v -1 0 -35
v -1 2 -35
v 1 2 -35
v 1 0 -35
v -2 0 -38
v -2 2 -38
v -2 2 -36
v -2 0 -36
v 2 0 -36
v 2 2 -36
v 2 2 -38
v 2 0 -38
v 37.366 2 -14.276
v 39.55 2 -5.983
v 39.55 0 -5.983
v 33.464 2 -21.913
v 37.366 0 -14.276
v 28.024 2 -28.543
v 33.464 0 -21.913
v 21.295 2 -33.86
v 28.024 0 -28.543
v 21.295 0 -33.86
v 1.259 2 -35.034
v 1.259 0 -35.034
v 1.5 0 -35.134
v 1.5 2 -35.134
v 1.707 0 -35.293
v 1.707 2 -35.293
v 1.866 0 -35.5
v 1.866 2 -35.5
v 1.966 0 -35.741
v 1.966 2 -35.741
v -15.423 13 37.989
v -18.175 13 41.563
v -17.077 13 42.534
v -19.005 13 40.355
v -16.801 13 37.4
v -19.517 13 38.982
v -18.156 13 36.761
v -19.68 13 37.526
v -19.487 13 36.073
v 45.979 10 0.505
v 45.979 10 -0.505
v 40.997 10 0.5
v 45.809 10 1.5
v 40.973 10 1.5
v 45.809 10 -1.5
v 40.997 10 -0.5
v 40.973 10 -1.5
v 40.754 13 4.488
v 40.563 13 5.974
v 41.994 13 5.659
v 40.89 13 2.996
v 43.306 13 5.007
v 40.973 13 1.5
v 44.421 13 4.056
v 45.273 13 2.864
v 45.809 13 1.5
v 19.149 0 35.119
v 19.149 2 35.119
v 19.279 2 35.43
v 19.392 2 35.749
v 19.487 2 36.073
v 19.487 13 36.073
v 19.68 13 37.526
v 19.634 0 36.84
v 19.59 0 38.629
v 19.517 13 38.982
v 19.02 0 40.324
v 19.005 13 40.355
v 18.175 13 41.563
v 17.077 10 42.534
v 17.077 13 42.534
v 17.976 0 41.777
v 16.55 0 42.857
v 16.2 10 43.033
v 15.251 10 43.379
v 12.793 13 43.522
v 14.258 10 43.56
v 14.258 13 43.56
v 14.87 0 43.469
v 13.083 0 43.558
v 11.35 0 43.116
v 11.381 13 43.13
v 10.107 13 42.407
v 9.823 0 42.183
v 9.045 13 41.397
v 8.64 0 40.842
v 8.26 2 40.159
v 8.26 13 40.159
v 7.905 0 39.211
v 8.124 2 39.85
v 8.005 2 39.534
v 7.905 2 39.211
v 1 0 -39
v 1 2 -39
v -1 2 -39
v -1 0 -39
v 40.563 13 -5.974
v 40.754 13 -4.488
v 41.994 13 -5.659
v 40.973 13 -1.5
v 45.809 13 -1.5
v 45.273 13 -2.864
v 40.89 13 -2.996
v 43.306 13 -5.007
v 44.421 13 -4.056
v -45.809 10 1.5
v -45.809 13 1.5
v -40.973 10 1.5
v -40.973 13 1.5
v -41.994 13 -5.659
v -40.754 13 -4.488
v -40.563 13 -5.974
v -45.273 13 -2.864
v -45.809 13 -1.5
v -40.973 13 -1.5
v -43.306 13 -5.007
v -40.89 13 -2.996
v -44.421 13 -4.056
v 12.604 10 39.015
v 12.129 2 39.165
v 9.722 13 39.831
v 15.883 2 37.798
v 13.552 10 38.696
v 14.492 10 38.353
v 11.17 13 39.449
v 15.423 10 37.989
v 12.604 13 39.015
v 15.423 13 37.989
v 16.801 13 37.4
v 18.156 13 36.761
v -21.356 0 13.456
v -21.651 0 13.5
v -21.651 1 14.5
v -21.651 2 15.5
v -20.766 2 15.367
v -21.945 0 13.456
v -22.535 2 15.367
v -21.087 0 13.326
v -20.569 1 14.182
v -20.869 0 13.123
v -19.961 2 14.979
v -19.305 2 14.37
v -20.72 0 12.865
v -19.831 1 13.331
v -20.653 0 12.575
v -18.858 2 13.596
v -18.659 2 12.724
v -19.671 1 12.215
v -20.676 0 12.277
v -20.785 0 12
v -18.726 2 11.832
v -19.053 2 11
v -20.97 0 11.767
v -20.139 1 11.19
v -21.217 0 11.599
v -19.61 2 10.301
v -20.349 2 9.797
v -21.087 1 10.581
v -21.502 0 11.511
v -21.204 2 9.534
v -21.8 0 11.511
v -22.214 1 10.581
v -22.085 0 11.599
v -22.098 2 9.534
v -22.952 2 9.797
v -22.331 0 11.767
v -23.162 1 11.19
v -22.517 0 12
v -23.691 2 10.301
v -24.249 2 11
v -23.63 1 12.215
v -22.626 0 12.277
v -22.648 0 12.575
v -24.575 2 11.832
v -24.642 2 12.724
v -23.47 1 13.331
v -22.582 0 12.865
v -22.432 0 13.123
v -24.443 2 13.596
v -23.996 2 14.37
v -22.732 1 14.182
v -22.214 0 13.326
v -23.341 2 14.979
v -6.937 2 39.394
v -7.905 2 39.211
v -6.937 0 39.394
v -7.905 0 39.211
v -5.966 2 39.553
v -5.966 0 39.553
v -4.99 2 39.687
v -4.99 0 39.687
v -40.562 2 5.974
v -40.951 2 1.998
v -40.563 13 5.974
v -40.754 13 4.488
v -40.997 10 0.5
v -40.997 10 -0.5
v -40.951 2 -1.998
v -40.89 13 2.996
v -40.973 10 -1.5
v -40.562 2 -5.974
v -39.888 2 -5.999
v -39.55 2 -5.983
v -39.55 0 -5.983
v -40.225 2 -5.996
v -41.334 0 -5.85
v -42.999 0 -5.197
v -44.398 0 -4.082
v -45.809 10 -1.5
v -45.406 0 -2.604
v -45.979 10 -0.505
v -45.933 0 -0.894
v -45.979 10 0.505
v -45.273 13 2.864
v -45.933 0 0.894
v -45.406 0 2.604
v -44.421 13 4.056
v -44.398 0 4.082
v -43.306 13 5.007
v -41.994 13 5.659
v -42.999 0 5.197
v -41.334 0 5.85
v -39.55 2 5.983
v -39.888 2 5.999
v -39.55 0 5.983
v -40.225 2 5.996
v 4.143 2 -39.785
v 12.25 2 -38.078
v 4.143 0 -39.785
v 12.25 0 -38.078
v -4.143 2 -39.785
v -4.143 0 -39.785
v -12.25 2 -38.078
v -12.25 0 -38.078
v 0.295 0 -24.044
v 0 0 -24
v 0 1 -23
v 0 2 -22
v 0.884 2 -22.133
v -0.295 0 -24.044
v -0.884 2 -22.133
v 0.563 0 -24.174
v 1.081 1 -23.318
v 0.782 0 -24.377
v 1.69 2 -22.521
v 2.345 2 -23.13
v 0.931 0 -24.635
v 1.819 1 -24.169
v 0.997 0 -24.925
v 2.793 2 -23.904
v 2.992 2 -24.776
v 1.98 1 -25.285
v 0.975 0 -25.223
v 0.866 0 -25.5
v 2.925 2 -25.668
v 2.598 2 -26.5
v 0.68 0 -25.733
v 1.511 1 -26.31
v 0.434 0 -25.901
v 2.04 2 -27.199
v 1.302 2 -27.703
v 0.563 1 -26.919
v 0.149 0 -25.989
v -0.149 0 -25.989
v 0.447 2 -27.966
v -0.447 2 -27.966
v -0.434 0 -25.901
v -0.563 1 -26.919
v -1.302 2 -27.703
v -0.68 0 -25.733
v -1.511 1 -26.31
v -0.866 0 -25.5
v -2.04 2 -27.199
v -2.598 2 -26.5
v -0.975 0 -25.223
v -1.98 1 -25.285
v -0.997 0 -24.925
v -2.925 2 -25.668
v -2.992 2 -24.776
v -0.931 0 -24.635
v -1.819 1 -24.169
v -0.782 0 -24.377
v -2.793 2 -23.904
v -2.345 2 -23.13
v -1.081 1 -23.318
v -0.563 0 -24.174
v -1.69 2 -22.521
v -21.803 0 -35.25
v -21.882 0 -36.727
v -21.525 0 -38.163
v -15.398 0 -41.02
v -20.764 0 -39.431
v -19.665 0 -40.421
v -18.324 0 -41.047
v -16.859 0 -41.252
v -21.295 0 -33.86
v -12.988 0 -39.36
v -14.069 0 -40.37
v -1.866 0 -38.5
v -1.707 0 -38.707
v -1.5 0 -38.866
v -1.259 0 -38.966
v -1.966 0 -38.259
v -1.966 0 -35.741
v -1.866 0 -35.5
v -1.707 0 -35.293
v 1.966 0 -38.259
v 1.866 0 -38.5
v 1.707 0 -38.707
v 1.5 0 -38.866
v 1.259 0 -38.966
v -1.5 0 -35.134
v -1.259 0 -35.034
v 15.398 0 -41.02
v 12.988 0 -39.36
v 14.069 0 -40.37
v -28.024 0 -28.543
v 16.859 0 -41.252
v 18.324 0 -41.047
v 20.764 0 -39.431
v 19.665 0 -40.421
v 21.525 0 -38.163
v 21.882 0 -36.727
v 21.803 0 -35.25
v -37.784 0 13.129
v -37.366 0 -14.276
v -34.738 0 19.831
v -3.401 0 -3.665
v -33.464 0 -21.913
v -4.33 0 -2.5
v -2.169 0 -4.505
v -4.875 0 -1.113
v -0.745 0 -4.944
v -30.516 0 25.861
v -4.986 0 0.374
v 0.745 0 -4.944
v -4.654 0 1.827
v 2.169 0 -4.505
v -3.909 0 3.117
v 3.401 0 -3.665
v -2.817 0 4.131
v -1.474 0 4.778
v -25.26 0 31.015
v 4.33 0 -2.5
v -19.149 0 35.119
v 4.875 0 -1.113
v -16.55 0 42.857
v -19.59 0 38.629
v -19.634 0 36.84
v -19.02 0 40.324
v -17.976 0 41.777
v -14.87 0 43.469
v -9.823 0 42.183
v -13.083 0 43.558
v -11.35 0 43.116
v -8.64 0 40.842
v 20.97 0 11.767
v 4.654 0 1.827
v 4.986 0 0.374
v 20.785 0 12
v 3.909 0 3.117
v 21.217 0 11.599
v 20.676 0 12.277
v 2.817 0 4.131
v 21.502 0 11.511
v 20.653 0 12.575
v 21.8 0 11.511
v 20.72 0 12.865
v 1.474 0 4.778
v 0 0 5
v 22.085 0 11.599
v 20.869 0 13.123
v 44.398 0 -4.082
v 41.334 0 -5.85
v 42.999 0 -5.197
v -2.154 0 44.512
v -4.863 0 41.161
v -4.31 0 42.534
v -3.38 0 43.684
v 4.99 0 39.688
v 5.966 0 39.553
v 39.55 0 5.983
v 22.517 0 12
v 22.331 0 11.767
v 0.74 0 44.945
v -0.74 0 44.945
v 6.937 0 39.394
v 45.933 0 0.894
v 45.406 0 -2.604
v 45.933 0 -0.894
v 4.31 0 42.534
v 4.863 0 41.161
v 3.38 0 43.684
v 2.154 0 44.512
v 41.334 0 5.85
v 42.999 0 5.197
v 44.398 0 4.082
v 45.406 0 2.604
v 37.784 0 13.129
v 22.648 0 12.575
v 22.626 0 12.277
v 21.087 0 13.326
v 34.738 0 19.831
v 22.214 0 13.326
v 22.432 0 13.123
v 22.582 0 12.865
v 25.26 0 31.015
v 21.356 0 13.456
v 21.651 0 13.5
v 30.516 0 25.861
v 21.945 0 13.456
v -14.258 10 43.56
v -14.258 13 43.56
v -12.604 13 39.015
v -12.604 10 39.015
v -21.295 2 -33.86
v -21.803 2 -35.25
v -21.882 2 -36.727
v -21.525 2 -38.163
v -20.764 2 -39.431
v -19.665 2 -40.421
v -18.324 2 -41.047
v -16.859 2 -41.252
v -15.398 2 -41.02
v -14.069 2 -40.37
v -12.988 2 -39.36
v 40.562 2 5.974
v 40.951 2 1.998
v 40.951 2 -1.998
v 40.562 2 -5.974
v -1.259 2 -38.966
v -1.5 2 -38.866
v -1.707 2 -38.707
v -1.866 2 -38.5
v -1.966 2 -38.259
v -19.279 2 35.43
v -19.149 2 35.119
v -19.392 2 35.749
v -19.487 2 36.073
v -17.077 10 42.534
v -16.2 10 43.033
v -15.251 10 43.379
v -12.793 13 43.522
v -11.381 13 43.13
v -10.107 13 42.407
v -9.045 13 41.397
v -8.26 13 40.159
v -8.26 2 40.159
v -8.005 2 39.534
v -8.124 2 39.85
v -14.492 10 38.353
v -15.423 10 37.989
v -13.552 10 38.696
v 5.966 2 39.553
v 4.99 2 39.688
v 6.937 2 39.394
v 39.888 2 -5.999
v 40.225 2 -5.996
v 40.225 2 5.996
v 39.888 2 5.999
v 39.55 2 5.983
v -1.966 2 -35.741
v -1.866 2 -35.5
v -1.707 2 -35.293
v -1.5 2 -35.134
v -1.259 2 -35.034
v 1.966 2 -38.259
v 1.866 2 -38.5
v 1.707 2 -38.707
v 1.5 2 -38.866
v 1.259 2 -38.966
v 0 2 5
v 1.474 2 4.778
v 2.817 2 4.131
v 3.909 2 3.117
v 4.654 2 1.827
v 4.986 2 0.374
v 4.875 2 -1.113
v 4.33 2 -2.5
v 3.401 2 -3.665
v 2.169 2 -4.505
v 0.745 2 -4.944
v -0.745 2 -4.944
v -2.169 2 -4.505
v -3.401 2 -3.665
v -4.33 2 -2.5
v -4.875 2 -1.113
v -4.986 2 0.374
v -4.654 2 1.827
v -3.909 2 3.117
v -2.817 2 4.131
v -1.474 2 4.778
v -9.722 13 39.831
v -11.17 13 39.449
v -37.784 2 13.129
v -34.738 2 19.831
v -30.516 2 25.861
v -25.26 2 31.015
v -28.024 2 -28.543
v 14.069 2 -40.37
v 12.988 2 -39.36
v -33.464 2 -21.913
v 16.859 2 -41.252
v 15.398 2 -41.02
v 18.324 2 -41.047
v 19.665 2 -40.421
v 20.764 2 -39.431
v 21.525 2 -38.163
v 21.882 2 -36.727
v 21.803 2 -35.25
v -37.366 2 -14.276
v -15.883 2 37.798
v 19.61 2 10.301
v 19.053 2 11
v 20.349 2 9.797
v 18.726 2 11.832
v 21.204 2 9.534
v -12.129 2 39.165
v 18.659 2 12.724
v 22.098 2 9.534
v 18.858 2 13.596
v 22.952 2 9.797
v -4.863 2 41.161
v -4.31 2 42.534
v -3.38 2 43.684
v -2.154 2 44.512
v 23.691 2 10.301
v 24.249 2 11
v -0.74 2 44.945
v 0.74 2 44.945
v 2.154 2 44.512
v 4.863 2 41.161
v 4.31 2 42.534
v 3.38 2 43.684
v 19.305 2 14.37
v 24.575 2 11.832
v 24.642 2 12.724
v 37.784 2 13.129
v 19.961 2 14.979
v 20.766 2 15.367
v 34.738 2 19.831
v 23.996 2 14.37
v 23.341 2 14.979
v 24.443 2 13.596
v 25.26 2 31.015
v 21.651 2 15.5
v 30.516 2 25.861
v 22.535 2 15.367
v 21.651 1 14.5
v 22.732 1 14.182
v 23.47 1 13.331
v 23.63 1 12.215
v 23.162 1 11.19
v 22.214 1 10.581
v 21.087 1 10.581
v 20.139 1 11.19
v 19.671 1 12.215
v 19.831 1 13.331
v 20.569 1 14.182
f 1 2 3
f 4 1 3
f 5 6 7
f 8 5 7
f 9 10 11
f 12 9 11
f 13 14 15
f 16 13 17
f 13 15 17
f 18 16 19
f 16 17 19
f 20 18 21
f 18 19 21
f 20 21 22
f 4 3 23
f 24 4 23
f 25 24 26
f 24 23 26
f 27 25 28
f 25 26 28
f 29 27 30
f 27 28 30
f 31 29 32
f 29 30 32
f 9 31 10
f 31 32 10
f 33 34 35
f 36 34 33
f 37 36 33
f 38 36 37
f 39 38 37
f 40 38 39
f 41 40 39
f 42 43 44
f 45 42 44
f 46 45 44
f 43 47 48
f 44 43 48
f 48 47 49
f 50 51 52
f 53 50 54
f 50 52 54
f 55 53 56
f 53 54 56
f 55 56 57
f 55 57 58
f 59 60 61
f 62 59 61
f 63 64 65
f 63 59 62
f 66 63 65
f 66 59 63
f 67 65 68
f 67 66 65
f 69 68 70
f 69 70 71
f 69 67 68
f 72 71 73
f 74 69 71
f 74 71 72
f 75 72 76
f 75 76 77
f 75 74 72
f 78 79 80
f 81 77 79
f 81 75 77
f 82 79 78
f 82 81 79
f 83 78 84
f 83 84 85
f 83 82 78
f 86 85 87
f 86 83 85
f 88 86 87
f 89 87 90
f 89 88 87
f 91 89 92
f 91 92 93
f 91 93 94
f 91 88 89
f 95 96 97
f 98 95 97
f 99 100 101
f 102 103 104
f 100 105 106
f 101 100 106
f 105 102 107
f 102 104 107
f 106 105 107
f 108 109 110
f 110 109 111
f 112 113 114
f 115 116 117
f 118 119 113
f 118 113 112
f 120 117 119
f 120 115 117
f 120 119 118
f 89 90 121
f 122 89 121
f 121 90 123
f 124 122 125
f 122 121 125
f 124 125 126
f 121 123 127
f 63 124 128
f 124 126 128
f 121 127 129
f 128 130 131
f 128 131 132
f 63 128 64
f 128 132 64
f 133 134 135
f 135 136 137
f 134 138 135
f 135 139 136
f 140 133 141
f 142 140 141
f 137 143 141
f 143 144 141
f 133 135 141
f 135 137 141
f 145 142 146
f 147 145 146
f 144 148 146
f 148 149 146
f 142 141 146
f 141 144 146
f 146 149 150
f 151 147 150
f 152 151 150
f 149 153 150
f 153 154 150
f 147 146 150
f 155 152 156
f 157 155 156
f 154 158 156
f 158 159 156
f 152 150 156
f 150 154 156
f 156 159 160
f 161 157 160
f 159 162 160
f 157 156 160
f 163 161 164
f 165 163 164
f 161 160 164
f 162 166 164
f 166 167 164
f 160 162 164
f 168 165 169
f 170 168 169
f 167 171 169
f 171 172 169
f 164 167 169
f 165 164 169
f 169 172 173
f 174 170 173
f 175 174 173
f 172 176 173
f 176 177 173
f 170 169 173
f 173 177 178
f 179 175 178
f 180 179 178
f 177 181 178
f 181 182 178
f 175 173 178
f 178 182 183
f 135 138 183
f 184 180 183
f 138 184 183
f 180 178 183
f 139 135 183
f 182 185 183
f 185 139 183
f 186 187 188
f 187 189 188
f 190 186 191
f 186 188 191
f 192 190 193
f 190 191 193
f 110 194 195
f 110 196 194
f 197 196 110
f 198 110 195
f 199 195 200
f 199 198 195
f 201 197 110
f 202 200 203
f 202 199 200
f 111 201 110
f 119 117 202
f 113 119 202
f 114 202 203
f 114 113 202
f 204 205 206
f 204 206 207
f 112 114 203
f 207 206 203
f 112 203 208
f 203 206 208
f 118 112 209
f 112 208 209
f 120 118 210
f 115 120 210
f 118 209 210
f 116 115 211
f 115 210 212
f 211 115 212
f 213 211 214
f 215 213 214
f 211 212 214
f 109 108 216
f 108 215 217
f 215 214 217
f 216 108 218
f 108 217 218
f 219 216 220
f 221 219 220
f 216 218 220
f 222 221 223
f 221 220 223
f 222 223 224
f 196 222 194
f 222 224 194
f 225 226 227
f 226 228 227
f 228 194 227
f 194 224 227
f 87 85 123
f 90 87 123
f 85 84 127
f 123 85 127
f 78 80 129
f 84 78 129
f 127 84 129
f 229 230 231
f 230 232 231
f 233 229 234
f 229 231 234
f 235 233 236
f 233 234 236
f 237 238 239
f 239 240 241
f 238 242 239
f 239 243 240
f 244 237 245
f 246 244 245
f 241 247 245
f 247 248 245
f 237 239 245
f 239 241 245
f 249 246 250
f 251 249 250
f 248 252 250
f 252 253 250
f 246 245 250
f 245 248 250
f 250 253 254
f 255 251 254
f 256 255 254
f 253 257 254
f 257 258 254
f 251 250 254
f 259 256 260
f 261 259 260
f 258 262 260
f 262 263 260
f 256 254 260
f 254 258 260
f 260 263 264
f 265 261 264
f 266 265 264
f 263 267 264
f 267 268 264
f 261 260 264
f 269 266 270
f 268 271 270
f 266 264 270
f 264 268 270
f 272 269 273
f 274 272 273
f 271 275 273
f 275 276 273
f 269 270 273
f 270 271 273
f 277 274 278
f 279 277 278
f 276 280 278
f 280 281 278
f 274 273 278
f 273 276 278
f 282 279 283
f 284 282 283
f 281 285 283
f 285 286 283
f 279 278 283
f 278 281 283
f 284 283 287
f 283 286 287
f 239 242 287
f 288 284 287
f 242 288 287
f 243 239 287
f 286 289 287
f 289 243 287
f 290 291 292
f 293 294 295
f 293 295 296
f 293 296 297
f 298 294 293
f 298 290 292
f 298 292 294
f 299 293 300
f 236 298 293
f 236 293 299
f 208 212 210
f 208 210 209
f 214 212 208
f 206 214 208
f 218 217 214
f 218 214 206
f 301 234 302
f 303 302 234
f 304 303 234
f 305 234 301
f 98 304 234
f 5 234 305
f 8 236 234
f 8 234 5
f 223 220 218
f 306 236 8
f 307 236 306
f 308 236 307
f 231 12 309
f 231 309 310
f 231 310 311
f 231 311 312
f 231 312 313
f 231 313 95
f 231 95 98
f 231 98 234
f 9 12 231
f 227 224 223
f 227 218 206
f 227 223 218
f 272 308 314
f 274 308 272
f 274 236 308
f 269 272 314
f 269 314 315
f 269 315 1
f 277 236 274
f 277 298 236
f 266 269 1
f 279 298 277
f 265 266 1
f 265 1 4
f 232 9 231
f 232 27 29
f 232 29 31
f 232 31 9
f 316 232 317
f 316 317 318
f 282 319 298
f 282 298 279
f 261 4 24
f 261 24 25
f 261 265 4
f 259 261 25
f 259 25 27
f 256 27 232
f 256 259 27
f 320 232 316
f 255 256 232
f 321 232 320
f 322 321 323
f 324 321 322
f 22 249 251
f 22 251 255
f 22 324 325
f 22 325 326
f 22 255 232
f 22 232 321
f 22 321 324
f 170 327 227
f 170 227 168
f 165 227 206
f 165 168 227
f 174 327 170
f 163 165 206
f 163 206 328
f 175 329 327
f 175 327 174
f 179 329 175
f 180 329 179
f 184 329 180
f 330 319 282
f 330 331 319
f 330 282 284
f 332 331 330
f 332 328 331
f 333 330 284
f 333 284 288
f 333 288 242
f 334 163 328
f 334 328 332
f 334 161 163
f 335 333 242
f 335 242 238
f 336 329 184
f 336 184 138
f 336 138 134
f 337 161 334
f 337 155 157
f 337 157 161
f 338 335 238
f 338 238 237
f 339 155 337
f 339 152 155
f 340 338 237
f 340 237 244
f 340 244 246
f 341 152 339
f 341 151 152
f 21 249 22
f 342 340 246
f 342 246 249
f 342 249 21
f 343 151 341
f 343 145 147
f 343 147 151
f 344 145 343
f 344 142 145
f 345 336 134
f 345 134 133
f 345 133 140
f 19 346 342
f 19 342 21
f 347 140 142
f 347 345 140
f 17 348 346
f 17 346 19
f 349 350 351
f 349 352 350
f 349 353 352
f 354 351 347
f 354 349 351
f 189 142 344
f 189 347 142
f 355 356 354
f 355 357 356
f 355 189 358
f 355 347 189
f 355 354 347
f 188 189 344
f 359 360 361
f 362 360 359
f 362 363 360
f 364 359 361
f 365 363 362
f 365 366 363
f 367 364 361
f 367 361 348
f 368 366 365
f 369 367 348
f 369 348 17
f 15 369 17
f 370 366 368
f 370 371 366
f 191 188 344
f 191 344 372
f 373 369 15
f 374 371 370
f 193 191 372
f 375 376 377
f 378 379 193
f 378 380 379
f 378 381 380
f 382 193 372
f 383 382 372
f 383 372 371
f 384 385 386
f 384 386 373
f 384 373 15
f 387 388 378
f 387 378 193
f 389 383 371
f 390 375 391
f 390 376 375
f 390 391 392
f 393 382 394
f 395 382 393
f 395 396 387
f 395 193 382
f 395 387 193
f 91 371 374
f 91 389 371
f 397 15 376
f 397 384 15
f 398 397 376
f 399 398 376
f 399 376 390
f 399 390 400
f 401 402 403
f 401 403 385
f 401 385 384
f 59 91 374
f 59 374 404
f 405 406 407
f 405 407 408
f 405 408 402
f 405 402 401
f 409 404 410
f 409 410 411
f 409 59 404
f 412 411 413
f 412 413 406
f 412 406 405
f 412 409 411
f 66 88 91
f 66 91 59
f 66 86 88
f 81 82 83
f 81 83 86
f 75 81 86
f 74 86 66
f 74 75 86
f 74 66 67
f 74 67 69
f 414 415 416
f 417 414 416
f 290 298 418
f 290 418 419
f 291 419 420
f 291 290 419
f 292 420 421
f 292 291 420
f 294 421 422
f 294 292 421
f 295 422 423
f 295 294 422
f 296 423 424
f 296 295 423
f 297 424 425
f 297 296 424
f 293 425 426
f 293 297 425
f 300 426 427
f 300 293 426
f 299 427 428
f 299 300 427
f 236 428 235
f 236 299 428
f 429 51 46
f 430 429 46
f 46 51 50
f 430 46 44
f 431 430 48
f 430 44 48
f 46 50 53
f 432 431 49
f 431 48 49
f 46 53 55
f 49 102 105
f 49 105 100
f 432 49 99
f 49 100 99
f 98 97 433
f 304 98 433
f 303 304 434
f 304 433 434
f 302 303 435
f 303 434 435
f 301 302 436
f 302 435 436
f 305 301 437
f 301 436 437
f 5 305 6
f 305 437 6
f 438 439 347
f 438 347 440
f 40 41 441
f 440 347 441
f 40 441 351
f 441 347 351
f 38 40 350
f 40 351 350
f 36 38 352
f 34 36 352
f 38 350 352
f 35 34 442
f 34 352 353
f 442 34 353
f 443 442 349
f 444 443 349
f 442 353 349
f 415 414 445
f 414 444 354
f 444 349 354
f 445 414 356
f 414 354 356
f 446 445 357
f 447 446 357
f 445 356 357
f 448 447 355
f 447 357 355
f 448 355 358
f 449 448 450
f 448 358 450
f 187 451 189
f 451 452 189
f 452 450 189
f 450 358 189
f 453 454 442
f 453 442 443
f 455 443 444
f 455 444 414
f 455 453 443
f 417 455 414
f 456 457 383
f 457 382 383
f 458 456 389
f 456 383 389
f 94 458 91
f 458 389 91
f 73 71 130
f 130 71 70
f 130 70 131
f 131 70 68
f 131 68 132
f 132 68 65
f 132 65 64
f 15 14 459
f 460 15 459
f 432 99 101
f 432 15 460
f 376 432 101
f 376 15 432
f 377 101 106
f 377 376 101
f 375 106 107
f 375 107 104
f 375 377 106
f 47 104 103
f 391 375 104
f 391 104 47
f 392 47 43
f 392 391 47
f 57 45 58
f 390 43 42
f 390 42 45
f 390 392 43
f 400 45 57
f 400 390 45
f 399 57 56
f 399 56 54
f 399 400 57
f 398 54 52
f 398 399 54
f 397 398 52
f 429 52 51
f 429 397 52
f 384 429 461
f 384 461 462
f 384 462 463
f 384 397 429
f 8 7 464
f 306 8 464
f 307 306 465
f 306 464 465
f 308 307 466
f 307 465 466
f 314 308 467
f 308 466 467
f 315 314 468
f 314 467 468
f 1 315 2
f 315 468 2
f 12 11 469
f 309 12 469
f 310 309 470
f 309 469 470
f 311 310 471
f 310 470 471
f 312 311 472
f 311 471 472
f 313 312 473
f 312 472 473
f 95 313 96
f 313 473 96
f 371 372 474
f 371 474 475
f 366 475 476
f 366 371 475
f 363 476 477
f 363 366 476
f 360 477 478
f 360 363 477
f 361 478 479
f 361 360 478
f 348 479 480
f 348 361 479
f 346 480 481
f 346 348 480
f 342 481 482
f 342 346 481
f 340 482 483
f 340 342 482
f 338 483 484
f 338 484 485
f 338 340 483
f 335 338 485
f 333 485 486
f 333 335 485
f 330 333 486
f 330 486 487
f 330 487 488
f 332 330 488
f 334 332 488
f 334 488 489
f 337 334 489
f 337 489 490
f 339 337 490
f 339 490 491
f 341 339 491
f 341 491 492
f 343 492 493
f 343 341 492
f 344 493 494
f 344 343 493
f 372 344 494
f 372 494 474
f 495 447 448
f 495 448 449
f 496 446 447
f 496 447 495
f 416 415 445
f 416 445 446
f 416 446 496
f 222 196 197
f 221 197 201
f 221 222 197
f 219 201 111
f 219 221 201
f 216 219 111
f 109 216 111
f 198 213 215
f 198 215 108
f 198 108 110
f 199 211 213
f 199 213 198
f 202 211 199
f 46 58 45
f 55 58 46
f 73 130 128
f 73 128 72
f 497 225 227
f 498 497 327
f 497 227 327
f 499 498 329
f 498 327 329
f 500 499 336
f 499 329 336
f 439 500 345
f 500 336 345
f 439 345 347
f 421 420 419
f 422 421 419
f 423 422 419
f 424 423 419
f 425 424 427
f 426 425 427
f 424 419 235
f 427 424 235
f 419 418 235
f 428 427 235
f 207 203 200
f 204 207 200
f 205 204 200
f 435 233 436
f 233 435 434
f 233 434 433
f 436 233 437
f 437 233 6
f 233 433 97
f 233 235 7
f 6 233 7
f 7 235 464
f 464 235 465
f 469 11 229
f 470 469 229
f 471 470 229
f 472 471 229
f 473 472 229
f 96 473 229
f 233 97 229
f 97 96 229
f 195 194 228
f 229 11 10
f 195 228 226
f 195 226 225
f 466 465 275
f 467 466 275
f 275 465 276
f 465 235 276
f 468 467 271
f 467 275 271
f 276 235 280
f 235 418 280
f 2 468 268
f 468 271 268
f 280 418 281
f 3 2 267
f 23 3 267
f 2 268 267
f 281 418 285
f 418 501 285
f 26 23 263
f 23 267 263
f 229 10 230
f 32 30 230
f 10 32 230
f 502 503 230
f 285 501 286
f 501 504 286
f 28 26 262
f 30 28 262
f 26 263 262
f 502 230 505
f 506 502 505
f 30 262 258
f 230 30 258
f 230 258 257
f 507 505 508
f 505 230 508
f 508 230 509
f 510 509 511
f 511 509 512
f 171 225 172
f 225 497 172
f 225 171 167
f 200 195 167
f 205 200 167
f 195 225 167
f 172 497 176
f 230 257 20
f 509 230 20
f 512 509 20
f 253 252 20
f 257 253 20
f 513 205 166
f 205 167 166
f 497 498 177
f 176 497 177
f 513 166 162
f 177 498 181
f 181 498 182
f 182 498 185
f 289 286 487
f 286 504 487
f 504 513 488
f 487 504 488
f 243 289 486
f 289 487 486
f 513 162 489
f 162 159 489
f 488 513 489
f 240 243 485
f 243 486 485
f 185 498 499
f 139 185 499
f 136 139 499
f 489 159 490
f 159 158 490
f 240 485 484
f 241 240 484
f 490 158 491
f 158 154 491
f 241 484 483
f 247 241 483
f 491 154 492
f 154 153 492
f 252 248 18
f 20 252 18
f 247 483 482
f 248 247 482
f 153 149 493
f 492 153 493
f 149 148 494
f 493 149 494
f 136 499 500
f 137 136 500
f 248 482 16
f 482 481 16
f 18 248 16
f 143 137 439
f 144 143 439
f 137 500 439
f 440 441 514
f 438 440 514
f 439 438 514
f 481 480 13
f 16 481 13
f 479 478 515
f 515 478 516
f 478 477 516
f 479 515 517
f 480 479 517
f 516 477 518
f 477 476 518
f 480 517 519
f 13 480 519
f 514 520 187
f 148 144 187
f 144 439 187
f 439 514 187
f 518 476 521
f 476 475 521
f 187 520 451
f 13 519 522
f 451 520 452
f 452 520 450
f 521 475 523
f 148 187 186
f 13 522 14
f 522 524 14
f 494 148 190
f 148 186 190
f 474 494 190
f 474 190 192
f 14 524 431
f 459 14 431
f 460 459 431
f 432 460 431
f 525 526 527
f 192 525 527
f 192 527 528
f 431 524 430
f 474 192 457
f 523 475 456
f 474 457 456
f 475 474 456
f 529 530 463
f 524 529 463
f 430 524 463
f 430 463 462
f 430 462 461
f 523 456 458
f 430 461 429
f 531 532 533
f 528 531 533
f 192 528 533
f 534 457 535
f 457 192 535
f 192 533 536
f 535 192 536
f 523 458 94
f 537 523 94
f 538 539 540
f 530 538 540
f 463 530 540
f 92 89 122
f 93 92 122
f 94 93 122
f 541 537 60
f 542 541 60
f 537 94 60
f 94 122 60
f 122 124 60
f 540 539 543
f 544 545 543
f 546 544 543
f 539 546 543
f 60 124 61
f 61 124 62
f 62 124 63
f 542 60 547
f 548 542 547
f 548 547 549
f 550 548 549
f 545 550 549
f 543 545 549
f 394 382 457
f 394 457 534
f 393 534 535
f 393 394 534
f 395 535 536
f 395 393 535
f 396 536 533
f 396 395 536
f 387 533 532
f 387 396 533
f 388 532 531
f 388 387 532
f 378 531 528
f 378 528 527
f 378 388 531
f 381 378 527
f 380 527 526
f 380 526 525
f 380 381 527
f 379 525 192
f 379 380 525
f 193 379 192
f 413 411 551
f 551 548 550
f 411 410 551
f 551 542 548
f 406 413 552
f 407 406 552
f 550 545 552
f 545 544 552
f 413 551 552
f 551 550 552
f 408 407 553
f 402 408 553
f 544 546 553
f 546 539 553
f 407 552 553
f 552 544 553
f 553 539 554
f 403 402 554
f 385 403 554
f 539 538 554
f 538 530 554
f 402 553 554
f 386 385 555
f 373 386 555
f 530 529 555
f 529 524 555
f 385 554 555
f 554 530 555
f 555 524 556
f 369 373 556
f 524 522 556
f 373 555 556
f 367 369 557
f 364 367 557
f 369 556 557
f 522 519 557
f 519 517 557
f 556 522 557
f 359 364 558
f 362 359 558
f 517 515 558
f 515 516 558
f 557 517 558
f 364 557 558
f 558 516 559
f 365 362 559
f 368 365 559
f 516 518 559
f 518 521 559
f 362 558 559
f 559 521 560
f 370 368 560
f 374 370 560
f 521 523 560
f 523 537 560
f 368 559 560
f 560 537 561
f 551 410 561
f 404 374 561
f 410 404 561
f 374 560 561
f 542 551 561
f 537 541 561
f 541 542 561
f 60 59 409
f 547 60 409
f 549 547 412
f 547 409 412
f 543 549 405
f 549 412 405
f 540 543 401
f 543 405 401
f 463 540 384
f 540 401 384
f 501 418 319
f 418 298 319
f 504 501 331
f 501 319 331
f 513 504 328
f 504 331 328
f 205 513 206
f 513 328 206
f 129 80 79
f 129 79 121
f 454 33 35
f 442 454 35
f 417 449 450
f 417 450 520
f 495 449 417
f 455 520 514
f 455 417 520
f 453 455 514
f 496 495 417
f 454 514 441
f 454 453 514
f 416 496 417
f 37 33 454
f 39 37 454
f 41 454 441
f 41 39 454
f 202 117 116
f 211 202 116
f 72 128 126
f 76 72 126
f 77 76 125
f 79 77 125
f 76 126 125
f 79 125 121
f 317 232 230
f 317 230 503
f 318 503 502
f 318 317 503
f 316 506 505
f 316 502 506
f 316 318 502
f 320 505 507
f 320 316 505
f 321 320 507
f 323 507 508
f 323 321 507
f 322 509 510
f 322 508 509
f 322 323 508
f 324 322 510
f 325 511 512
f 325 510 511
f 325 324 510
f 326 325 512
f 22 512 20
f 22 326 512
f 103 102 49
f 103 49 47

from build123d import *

# Parameters (mm, degrees)
SKETCH1_R           = 40
SKETCH1_R_2         = 5
SKETCH1_R_3         = 1
BOSS_EXTRUDE1_DEPTH = 2
CUT_EXTRUDE1_REACH  = 58.604
SKETCH6_R           = 6
BOSS_EXTRUDE4_DEPTH = 13
SKETCH9_R           = 41
CUT_EXTRUDE2_DEPTH  = 11
CUT_EXTRUDE3_DEPTH  = 3
CHAMFER1_SIZE       = 2
SKETCH11_R          = 5
BOSS_EXTRUDE5_DEPTH = 2


with BuildPart() as part:
    # Sketch1 → Boss-Extrude1 (new body)
    with BuildSketch(Plane(origin=(0, 0, 0), x_dir=(1, 0, 0), z_dir=(0, 1, 0))):
        with Locations(Location((0, 0, 0), (0, 0, 270))):
            Circle(SKETCH1_R)
        with Locations(Location((0, 0, 0), (0, 0, 270))):
            Circle(SKETCH1_R_2, mode=Mode.SUBTRACT)
        with Locations(Location((0, 25, 0), (0, 0, 270))):
            Circle(SKETCH1_R_3, mode=Mode.SUBTRACT)
        with Locations(Location((21.650635095, -12.5, 0), (0, 0, 270))):
            Circle(SKETCH1_R_3, mode=Mode.SUBTRACT)
        with Locations(Location((-21.650635095, -12.5, 0), (0, 0, 270))):
            Circle(SKETCH1_R_3, mode=Mode.SUBTRACT)
    extrude(amount=BOSS_EXTRUDE1_DEPTH)

    # Sketch2 → Cut-Extrude1 (cut, up to next)
    with BuildSketch(Plane(origin=(0, 2, 0), x_dir=(1, 0, 0), z_dir=(0, 1, 0)), mode=Mode.PRIVATE) as cut_extrude1_sk1:
        with BuildLine():
            Line((-1, 35), (1, 35))
            ThreePointArc((1, 35), (1.707106781, 35.292893219), (2, 36))
            Line((2, 36), (2, 38))
            ThreePointArc((2, 38), (1.707106781, 38.707106781), (1, 39))
            Line((1, 39), (-1, 39))
            ThreePointArc((-1, 39), (-1.707106781, 38.707106781), (-2, 38))
            Line((-2, 38), (-2, 36))
            ThreePointArc((-2, 36), (-1.707106781, 35.292893219), (-1, 35))
        make_face()
    cut_extrude1_tool1 = extrude(cut_extrude1_sk1.sketch, amount=-CUT_EXTRUDE1_REACH, mode=Mode.PRIVATE) & part.part
    add(cut_extrude1_tool1.solids().sort_by_distance((0, 2, -37))[0], mode=Mode.SUBTRACT)

    # Sketch6 → Boss-Extrude4 (add)
    with BuildSketch(Plane.XZ):
        with Locations(Location((13.680805733, 37.587704831, 0), (0, 0, 270))):
            Circle(SKETCH6_R)
        with Locations(Location((40, 0, 0), (0, 0, 270))):
            Circle(SKETCH6_R)
    boss_extrude4 = extrude(amount=-BOSS_EXTRUDE4_DEPTH)

    # Sketch9 → Cut-Extrude2 (cut)
    with BuildSketch(Plane(origin=(0, 13, 0), x_dir=(1, 0, 0), z_dir=(0, 1, 0))):
        Circle(SKETCH9_R)
    cut_extrude2 = extrude(amount=-CUT_EXTRUDE2_DEPTH, mode=Mode.SUBTRACT)

    # Sketch10 → Cut-Extrude3 (cut)
    with BuildSketch(Plane(origin=(0, 13, 0), x_dir=(1, 0, 0), z_dir=(0, 1, 0))):
        with BuildLine():
            Line((40.972551788, 1.5), (45.809475019, 1.5))
            ThreePointArc((45.809475019, 1.5), (46, 0), (45.809475019, -1.5))
            Line((45.809475019, -1.5), (40.972551788, -1.5))
            ThreePointArc((40.972551788, -1.5), (41, 0), (40.972551788, 1.5))
        make_face()
        with BuildLine():
            Line((15.422976966, -37.988574355), (17.077302143, -42.533795423))
            ThreePointArc((17.077302143, -42.533795423), (15.732926593, -43.225860556), (14.258224281, -43.559855853))
            Line((14.258224281, -43.559855853), (12.603899104, -39.014634785))
            ThreePointArc((12.603899104, -39.014634785), (14.022825876, -38.527397452), (15.422976966, -37.988574355))
        make_face()
    cut_extrude3 = extrude(amount=-CUT_EXTRUDE3_DEPTH, mode=Mode.SUBTRACT)

    # Mirror2: Boss-Extrude4, Cut-Extrude2, Cut-Extrude3 across plane
    add(boss_extrude4.mirror(Plane(origin=(0, 0, 0), x_dir=(0, 0, 1), z_dir=(1, 0, 0))))
    add(cut_extrude2.mirror(Plane(origin=(0, 0, 0), x_dir=(0, 0, 1), z_dir=(1, 0, 0))), mode=Mode.SUBTRACT)
    add(cut_extrude3.mirror(Plane(origin=(0, 0, 0), x_dir=(0, 0, 1), z_dir=(1, 0, 0))), mode=Mode.SUBTRACT)

    # Chamfer1
    chamfer1_edges = [part.edges().sort_by_distance(p)[0] for p in [
        (21.650635095, 2, 11.5),
        (-21.650635095, 2, 11.5),
        (0, 2, -26),
    ]]
    chamfer(chamfer1_edges, length=CHAMFER1_SIZE - 0.0001)  # a hair under: the kernel refuses the full size

    # Sketch11 → Boss-Extrude5 (add)
    with BuildSketch(Plane.XZ):
        with Locations((0, 40)):
            Circle(SKETCH11_R)
        with Locations((16.90473047, -36.252311481)):
            Circle(SKETCH11_R)
        with Locations((-16.90473047, -36.252311481)):
            Circle(SKETCH11_R)
    extrude(amount=-BOSS_EXTRUDE5_DEPTH)


solid = part.part
